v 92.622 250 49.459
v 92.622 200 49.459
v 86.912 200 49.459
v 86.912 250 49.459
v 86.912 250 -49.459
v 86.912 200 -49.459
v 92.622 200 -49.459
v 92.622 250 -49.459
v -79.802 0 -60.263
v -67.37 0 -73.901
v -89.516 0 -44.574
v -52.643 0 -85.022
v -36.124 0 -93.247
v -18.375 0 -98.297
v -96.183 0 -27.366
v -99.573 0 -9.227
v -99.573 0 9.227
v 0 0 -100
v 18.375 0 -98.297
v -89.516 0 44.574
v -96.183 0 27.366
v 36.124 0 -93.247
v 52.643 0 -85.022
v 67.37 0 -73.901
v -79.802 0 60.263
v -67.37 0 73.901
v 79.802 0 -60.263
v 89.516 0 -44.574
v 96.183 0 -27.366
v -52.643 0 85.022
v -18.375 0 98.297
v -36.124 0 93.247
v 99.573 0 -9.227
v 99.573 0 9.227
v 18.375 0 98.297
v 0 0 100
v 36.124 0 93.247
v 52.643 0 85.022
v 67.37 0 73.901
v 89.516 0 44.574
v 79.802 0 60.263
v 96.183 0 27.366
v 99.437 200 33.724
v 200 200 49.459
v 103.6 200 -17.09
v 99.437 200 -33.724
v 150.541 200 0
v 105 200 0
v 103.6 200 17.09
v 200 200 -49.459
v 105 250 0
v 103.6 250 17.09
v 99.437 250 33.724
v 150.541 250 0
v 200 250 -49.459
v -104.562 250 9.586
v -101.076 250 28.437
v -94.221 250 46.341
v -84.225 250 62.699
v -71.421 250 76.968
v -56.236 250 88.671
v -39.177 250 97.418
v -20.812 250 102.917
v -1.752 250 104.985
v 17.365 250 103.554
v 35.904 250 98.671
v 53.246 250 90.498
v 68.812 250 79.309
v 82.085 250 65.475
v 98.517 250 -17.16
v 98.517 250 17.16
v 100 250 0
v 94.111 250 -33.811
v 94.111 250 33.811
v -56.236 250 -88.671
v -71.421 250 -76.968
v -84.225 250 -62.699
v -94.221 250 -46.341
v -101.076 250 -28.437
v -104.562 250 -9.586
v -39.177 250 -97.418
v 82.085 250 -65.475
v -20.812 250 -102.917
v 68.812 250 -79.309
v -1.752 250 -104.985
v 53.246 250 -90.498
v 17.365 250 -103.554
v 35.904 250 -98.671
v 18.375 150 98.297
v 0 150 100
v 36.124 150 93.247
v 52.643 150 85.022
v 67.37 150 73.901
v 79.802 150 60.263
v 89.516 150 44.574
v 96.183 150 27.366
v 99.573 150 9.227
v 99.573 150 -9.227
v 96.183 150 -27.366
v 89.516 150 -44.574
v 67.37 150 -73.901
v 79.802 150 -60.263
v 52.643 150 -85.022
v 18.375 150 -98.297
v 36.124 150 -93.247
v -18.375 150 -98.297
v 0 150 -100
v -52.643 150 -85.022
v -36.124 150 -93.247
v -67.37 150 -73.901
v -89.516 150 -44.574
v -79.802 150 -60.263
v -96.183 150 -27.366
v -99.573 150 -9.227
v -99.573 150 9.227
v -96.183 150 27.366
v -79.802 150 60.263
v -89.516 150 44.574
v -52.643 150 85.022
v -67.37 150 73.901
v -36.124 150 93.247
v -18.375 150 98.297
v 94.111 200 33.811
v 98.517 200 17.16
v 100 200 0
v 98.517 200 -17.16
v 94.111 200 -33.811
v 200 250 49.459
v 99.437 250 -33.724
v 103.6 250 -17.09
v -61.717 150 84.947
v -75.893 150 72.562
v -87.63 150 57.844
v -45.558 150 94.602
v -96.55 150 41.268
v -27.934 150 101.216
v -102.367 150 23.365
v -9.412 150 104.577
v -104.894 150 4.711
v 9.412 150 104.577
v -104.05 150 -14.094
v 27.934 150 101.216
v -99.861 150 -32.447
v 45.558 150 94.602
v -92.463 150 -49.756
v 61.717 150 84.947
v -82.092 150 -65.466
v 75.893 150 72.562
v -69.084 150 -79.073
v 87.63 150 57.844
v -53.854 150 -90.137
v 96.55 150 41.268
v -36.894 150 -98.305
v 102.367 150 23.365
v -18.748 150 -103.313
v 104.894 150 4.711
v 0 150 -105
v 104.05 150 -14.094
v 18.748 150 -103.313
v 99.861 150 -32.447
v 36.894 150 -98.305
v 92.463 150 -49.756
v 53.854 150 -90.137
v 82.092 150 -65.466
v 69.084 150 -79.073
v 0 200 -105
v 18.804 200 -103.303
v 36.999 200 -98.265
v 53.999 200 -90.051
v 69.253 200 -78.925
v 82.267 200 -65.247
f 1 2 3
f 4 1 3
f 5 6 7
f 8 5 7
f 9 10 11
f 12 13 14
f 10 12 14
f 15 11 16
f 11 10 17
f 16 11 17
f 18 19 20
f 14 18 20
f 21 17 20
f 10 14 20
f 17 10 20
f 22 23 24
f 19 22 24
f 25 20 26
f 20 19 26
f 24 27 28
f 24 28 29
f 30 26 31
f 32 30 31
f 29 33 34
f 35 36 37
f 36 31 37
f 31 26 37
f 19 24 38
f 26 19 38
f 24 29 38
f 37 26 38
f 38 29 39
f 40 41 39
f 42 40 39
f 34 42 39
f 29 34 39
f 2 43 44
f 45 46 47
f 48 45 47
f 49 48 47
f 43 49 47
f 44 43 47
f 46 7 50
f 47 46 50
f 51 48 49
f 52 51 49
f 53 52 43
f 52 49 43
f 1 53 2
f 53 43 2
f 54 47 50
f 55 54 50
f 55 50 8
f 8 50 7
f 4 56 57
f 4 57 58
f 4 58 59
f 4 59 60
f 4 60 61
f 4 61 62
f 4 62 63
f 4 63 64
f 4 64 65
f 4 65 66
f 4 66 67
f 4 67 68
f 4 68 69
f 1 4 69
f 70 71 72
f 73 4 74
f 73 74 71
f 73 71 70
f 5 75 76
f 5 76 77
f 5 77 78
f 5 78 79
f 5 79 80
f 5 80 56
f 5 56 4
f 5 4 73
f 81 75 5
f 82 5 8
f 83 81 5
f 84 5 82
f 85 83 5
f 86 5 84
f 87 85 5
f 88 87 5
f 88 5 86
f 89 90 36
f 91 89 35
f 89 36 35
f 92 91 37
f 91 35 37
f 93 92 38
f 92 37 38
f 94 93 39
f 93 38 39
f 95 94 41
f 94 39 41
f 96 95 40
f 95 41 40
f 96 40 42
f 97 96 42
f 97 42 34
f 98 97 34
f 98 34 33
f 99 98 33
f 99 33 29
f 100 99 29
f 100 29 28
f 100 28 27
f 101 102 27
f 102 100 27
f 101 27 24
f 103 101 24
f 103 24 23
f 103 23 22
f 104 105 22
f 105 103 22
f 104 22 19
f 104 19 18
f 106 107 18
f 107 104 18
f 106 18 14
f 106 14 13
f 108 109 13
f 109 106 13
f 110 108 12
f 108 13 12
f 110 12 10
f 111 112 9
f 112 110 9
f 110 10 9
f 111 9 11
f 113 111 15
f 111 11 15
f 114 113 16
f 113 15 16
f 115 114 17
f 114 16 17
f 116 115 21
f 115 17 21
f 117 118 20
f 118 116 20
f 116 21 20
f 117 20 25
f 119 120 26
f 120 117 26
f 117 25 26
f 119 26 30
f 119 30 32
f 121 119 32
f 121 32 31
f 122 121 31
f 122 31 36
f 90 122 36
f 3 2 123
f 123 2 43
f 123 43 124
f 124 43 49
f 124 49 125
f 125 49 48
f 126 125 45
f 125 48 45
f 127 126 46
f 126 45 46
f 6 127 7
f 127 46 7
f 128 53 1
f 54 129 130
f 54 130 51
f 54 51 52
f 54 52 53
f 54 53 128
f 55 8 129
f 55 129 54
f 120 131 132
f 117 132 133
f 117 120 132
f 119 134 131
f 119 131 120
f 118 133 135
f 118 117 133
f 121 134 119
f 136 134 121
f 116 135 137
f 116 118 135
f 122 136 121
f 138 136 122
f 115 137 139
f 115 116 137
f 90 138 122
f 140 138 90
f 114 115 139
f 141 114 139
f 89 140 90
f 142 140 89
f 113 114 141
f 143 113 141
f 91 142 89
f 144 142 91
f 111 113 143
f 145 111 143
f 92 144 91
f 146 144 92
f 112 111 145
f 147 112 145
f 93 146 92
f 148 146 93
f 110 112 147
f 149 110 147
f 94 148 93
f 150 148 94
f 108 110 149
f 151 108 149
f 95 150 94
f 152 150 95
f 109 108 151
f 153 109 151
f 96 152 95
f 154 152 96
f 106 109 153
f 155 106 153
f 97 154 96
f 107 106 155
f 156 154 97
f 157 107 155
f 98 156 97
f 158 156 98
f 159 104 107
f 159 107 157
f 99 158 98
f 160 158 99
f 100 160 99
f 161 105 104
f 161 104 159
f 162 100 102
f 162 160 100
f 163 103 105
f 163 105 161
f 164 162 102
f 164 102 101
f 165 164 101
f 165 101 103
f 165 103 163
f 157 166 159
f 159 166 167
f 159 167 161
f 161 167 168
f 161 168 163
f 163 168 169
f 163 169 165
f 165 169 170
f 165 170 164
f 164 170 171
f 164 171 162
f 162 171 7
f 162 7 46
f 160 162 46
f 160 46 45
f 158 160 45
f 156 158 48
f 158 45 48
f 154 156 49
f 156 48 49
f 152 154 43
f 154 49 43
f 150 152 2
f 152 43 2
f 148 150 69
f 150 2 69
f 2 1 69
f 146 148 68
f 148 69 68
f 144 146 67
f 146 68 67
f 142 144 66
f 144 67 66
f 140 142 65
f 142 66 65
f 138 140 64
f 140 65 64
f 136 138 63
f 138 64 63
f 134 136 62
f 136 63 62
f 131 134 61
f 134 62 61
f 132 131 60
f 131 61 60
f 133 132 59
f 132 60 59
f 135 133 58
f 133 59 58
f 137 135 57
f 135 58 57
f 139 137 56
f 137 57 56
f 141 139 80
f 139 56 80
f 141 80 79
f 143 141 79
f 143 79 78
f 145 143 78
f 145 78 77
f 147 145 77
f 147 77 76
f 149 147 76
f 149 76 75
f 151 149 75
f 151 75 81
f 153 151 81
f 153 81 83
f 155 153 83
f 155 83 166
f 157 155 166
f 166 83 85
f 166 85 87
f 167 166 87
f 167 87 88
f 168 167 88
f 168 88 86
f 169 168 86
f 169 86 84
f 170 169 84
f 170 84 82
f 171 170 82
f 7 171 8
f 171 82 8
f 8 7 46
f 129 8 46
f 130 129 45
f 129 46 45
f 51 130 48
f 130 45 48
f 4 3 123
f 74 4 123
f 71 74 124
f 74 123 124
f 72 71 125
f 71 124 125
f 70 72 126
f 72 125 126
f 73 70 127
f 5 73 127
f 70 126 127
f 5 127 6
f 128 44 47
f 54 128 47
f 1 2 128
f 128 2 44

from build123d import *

# Parameters (mm, degrees)
SKETCH1_R           = 100
BOSS_EXTRUDE1_DEPTH = 200
SKETCH4_R           = 100
BOSS_EXTRUDE5_DEPTH = 50
SKETCH5_R           = 105
BOSS_EXTRUDE6_DEPTH = 50


with BuildPart() as part:
    # Sketch1 → Boss-Extrude1 (new body)
    with BuildSketch(Plane(origin=(0, 0, 0), x_dir=(1, 0, 0), z_dir=(0, 1, 0))):
        with Locations(Location((0, 0, 0), (0, 0, 270))):
            Circle(SKETCH1_R)
    extrude(amount=BOSS_EXTRUDE1_DEPTH)

    # Sketch4 → Boss-Extrude5 (add)
    with BuildSketch(Plane(origin=(0, 200, 0), x_dir=(1, 0, 0), z_dir=(0, 1, 0))):
        with BuildLine():
            Line((150.540661514, 0), (200, 49.459338486))
            Line((200, 49.459338486), (92.621670448, 49.459338486))
            ThreePointArc((92.621670448, 49.459338486), (101.85841987, 25.492396935), (105, 0))
            ThreePointArc((105, 0), (101.85841987, -25.492396935), (92.621670448, -49.459338486))
            Line((92.621670448, -49.459338486), (200, -49.459338486))
            Line((200, -49.459338486), (150.540661514, 0))
        make_face()
        with Locations(Location((0, 0, 0), (0, 0, 29.64294125))):
            Circle(SKETCH4_R)
        with BuildLine():
            Line((86.912449261, 49.459338486), (92.621670448, 49.459338486))
            ThreePointArc((92.621670448, 49.459338486), (-105, 0), (92.621670448, -49.459338486))
            Line((92.621670448, -49.459338486), (86.912449261, -49.459338486))
            ThreePointArc((86.912449261, -49.459338486), (-100, 0), (86.912449261, 49.459338486))
        make_face()
    extrude(amount=BOSS_EXTRUDE5_DEPTH)


with BuildPart() as boss_extrude5_piece_1:
    # of the separate pieces the step leaves, piece 1, a body of its own (boss_extrude5_pieces)
    add(part.part.solids().sort_by_distance((0, 0, 100))[0])

    # Sketch5 → Boss-Extrude6 (add)
    with BuildSketch(Plane.XZ.offset(-200)):
        with Locations(Location((0, 0, 0), (0, 0, 270))):
            Circle(SKETCH5_R)
    extrude(amount=BOSS_EXTRUDE6_DEPTH)


with BuildPart() as boss_extrude5_piece_2:
    # of the separate pieces the step leaves, piece 2, a body of its own (boss_extrude5_pieces)
    add(part.part.solids().sort_by_distance((200, 200, 49.459338486))[0])


solid = Compound([boss_extrude5_piece_1.part, boss_extrude5_piece_2.part])
